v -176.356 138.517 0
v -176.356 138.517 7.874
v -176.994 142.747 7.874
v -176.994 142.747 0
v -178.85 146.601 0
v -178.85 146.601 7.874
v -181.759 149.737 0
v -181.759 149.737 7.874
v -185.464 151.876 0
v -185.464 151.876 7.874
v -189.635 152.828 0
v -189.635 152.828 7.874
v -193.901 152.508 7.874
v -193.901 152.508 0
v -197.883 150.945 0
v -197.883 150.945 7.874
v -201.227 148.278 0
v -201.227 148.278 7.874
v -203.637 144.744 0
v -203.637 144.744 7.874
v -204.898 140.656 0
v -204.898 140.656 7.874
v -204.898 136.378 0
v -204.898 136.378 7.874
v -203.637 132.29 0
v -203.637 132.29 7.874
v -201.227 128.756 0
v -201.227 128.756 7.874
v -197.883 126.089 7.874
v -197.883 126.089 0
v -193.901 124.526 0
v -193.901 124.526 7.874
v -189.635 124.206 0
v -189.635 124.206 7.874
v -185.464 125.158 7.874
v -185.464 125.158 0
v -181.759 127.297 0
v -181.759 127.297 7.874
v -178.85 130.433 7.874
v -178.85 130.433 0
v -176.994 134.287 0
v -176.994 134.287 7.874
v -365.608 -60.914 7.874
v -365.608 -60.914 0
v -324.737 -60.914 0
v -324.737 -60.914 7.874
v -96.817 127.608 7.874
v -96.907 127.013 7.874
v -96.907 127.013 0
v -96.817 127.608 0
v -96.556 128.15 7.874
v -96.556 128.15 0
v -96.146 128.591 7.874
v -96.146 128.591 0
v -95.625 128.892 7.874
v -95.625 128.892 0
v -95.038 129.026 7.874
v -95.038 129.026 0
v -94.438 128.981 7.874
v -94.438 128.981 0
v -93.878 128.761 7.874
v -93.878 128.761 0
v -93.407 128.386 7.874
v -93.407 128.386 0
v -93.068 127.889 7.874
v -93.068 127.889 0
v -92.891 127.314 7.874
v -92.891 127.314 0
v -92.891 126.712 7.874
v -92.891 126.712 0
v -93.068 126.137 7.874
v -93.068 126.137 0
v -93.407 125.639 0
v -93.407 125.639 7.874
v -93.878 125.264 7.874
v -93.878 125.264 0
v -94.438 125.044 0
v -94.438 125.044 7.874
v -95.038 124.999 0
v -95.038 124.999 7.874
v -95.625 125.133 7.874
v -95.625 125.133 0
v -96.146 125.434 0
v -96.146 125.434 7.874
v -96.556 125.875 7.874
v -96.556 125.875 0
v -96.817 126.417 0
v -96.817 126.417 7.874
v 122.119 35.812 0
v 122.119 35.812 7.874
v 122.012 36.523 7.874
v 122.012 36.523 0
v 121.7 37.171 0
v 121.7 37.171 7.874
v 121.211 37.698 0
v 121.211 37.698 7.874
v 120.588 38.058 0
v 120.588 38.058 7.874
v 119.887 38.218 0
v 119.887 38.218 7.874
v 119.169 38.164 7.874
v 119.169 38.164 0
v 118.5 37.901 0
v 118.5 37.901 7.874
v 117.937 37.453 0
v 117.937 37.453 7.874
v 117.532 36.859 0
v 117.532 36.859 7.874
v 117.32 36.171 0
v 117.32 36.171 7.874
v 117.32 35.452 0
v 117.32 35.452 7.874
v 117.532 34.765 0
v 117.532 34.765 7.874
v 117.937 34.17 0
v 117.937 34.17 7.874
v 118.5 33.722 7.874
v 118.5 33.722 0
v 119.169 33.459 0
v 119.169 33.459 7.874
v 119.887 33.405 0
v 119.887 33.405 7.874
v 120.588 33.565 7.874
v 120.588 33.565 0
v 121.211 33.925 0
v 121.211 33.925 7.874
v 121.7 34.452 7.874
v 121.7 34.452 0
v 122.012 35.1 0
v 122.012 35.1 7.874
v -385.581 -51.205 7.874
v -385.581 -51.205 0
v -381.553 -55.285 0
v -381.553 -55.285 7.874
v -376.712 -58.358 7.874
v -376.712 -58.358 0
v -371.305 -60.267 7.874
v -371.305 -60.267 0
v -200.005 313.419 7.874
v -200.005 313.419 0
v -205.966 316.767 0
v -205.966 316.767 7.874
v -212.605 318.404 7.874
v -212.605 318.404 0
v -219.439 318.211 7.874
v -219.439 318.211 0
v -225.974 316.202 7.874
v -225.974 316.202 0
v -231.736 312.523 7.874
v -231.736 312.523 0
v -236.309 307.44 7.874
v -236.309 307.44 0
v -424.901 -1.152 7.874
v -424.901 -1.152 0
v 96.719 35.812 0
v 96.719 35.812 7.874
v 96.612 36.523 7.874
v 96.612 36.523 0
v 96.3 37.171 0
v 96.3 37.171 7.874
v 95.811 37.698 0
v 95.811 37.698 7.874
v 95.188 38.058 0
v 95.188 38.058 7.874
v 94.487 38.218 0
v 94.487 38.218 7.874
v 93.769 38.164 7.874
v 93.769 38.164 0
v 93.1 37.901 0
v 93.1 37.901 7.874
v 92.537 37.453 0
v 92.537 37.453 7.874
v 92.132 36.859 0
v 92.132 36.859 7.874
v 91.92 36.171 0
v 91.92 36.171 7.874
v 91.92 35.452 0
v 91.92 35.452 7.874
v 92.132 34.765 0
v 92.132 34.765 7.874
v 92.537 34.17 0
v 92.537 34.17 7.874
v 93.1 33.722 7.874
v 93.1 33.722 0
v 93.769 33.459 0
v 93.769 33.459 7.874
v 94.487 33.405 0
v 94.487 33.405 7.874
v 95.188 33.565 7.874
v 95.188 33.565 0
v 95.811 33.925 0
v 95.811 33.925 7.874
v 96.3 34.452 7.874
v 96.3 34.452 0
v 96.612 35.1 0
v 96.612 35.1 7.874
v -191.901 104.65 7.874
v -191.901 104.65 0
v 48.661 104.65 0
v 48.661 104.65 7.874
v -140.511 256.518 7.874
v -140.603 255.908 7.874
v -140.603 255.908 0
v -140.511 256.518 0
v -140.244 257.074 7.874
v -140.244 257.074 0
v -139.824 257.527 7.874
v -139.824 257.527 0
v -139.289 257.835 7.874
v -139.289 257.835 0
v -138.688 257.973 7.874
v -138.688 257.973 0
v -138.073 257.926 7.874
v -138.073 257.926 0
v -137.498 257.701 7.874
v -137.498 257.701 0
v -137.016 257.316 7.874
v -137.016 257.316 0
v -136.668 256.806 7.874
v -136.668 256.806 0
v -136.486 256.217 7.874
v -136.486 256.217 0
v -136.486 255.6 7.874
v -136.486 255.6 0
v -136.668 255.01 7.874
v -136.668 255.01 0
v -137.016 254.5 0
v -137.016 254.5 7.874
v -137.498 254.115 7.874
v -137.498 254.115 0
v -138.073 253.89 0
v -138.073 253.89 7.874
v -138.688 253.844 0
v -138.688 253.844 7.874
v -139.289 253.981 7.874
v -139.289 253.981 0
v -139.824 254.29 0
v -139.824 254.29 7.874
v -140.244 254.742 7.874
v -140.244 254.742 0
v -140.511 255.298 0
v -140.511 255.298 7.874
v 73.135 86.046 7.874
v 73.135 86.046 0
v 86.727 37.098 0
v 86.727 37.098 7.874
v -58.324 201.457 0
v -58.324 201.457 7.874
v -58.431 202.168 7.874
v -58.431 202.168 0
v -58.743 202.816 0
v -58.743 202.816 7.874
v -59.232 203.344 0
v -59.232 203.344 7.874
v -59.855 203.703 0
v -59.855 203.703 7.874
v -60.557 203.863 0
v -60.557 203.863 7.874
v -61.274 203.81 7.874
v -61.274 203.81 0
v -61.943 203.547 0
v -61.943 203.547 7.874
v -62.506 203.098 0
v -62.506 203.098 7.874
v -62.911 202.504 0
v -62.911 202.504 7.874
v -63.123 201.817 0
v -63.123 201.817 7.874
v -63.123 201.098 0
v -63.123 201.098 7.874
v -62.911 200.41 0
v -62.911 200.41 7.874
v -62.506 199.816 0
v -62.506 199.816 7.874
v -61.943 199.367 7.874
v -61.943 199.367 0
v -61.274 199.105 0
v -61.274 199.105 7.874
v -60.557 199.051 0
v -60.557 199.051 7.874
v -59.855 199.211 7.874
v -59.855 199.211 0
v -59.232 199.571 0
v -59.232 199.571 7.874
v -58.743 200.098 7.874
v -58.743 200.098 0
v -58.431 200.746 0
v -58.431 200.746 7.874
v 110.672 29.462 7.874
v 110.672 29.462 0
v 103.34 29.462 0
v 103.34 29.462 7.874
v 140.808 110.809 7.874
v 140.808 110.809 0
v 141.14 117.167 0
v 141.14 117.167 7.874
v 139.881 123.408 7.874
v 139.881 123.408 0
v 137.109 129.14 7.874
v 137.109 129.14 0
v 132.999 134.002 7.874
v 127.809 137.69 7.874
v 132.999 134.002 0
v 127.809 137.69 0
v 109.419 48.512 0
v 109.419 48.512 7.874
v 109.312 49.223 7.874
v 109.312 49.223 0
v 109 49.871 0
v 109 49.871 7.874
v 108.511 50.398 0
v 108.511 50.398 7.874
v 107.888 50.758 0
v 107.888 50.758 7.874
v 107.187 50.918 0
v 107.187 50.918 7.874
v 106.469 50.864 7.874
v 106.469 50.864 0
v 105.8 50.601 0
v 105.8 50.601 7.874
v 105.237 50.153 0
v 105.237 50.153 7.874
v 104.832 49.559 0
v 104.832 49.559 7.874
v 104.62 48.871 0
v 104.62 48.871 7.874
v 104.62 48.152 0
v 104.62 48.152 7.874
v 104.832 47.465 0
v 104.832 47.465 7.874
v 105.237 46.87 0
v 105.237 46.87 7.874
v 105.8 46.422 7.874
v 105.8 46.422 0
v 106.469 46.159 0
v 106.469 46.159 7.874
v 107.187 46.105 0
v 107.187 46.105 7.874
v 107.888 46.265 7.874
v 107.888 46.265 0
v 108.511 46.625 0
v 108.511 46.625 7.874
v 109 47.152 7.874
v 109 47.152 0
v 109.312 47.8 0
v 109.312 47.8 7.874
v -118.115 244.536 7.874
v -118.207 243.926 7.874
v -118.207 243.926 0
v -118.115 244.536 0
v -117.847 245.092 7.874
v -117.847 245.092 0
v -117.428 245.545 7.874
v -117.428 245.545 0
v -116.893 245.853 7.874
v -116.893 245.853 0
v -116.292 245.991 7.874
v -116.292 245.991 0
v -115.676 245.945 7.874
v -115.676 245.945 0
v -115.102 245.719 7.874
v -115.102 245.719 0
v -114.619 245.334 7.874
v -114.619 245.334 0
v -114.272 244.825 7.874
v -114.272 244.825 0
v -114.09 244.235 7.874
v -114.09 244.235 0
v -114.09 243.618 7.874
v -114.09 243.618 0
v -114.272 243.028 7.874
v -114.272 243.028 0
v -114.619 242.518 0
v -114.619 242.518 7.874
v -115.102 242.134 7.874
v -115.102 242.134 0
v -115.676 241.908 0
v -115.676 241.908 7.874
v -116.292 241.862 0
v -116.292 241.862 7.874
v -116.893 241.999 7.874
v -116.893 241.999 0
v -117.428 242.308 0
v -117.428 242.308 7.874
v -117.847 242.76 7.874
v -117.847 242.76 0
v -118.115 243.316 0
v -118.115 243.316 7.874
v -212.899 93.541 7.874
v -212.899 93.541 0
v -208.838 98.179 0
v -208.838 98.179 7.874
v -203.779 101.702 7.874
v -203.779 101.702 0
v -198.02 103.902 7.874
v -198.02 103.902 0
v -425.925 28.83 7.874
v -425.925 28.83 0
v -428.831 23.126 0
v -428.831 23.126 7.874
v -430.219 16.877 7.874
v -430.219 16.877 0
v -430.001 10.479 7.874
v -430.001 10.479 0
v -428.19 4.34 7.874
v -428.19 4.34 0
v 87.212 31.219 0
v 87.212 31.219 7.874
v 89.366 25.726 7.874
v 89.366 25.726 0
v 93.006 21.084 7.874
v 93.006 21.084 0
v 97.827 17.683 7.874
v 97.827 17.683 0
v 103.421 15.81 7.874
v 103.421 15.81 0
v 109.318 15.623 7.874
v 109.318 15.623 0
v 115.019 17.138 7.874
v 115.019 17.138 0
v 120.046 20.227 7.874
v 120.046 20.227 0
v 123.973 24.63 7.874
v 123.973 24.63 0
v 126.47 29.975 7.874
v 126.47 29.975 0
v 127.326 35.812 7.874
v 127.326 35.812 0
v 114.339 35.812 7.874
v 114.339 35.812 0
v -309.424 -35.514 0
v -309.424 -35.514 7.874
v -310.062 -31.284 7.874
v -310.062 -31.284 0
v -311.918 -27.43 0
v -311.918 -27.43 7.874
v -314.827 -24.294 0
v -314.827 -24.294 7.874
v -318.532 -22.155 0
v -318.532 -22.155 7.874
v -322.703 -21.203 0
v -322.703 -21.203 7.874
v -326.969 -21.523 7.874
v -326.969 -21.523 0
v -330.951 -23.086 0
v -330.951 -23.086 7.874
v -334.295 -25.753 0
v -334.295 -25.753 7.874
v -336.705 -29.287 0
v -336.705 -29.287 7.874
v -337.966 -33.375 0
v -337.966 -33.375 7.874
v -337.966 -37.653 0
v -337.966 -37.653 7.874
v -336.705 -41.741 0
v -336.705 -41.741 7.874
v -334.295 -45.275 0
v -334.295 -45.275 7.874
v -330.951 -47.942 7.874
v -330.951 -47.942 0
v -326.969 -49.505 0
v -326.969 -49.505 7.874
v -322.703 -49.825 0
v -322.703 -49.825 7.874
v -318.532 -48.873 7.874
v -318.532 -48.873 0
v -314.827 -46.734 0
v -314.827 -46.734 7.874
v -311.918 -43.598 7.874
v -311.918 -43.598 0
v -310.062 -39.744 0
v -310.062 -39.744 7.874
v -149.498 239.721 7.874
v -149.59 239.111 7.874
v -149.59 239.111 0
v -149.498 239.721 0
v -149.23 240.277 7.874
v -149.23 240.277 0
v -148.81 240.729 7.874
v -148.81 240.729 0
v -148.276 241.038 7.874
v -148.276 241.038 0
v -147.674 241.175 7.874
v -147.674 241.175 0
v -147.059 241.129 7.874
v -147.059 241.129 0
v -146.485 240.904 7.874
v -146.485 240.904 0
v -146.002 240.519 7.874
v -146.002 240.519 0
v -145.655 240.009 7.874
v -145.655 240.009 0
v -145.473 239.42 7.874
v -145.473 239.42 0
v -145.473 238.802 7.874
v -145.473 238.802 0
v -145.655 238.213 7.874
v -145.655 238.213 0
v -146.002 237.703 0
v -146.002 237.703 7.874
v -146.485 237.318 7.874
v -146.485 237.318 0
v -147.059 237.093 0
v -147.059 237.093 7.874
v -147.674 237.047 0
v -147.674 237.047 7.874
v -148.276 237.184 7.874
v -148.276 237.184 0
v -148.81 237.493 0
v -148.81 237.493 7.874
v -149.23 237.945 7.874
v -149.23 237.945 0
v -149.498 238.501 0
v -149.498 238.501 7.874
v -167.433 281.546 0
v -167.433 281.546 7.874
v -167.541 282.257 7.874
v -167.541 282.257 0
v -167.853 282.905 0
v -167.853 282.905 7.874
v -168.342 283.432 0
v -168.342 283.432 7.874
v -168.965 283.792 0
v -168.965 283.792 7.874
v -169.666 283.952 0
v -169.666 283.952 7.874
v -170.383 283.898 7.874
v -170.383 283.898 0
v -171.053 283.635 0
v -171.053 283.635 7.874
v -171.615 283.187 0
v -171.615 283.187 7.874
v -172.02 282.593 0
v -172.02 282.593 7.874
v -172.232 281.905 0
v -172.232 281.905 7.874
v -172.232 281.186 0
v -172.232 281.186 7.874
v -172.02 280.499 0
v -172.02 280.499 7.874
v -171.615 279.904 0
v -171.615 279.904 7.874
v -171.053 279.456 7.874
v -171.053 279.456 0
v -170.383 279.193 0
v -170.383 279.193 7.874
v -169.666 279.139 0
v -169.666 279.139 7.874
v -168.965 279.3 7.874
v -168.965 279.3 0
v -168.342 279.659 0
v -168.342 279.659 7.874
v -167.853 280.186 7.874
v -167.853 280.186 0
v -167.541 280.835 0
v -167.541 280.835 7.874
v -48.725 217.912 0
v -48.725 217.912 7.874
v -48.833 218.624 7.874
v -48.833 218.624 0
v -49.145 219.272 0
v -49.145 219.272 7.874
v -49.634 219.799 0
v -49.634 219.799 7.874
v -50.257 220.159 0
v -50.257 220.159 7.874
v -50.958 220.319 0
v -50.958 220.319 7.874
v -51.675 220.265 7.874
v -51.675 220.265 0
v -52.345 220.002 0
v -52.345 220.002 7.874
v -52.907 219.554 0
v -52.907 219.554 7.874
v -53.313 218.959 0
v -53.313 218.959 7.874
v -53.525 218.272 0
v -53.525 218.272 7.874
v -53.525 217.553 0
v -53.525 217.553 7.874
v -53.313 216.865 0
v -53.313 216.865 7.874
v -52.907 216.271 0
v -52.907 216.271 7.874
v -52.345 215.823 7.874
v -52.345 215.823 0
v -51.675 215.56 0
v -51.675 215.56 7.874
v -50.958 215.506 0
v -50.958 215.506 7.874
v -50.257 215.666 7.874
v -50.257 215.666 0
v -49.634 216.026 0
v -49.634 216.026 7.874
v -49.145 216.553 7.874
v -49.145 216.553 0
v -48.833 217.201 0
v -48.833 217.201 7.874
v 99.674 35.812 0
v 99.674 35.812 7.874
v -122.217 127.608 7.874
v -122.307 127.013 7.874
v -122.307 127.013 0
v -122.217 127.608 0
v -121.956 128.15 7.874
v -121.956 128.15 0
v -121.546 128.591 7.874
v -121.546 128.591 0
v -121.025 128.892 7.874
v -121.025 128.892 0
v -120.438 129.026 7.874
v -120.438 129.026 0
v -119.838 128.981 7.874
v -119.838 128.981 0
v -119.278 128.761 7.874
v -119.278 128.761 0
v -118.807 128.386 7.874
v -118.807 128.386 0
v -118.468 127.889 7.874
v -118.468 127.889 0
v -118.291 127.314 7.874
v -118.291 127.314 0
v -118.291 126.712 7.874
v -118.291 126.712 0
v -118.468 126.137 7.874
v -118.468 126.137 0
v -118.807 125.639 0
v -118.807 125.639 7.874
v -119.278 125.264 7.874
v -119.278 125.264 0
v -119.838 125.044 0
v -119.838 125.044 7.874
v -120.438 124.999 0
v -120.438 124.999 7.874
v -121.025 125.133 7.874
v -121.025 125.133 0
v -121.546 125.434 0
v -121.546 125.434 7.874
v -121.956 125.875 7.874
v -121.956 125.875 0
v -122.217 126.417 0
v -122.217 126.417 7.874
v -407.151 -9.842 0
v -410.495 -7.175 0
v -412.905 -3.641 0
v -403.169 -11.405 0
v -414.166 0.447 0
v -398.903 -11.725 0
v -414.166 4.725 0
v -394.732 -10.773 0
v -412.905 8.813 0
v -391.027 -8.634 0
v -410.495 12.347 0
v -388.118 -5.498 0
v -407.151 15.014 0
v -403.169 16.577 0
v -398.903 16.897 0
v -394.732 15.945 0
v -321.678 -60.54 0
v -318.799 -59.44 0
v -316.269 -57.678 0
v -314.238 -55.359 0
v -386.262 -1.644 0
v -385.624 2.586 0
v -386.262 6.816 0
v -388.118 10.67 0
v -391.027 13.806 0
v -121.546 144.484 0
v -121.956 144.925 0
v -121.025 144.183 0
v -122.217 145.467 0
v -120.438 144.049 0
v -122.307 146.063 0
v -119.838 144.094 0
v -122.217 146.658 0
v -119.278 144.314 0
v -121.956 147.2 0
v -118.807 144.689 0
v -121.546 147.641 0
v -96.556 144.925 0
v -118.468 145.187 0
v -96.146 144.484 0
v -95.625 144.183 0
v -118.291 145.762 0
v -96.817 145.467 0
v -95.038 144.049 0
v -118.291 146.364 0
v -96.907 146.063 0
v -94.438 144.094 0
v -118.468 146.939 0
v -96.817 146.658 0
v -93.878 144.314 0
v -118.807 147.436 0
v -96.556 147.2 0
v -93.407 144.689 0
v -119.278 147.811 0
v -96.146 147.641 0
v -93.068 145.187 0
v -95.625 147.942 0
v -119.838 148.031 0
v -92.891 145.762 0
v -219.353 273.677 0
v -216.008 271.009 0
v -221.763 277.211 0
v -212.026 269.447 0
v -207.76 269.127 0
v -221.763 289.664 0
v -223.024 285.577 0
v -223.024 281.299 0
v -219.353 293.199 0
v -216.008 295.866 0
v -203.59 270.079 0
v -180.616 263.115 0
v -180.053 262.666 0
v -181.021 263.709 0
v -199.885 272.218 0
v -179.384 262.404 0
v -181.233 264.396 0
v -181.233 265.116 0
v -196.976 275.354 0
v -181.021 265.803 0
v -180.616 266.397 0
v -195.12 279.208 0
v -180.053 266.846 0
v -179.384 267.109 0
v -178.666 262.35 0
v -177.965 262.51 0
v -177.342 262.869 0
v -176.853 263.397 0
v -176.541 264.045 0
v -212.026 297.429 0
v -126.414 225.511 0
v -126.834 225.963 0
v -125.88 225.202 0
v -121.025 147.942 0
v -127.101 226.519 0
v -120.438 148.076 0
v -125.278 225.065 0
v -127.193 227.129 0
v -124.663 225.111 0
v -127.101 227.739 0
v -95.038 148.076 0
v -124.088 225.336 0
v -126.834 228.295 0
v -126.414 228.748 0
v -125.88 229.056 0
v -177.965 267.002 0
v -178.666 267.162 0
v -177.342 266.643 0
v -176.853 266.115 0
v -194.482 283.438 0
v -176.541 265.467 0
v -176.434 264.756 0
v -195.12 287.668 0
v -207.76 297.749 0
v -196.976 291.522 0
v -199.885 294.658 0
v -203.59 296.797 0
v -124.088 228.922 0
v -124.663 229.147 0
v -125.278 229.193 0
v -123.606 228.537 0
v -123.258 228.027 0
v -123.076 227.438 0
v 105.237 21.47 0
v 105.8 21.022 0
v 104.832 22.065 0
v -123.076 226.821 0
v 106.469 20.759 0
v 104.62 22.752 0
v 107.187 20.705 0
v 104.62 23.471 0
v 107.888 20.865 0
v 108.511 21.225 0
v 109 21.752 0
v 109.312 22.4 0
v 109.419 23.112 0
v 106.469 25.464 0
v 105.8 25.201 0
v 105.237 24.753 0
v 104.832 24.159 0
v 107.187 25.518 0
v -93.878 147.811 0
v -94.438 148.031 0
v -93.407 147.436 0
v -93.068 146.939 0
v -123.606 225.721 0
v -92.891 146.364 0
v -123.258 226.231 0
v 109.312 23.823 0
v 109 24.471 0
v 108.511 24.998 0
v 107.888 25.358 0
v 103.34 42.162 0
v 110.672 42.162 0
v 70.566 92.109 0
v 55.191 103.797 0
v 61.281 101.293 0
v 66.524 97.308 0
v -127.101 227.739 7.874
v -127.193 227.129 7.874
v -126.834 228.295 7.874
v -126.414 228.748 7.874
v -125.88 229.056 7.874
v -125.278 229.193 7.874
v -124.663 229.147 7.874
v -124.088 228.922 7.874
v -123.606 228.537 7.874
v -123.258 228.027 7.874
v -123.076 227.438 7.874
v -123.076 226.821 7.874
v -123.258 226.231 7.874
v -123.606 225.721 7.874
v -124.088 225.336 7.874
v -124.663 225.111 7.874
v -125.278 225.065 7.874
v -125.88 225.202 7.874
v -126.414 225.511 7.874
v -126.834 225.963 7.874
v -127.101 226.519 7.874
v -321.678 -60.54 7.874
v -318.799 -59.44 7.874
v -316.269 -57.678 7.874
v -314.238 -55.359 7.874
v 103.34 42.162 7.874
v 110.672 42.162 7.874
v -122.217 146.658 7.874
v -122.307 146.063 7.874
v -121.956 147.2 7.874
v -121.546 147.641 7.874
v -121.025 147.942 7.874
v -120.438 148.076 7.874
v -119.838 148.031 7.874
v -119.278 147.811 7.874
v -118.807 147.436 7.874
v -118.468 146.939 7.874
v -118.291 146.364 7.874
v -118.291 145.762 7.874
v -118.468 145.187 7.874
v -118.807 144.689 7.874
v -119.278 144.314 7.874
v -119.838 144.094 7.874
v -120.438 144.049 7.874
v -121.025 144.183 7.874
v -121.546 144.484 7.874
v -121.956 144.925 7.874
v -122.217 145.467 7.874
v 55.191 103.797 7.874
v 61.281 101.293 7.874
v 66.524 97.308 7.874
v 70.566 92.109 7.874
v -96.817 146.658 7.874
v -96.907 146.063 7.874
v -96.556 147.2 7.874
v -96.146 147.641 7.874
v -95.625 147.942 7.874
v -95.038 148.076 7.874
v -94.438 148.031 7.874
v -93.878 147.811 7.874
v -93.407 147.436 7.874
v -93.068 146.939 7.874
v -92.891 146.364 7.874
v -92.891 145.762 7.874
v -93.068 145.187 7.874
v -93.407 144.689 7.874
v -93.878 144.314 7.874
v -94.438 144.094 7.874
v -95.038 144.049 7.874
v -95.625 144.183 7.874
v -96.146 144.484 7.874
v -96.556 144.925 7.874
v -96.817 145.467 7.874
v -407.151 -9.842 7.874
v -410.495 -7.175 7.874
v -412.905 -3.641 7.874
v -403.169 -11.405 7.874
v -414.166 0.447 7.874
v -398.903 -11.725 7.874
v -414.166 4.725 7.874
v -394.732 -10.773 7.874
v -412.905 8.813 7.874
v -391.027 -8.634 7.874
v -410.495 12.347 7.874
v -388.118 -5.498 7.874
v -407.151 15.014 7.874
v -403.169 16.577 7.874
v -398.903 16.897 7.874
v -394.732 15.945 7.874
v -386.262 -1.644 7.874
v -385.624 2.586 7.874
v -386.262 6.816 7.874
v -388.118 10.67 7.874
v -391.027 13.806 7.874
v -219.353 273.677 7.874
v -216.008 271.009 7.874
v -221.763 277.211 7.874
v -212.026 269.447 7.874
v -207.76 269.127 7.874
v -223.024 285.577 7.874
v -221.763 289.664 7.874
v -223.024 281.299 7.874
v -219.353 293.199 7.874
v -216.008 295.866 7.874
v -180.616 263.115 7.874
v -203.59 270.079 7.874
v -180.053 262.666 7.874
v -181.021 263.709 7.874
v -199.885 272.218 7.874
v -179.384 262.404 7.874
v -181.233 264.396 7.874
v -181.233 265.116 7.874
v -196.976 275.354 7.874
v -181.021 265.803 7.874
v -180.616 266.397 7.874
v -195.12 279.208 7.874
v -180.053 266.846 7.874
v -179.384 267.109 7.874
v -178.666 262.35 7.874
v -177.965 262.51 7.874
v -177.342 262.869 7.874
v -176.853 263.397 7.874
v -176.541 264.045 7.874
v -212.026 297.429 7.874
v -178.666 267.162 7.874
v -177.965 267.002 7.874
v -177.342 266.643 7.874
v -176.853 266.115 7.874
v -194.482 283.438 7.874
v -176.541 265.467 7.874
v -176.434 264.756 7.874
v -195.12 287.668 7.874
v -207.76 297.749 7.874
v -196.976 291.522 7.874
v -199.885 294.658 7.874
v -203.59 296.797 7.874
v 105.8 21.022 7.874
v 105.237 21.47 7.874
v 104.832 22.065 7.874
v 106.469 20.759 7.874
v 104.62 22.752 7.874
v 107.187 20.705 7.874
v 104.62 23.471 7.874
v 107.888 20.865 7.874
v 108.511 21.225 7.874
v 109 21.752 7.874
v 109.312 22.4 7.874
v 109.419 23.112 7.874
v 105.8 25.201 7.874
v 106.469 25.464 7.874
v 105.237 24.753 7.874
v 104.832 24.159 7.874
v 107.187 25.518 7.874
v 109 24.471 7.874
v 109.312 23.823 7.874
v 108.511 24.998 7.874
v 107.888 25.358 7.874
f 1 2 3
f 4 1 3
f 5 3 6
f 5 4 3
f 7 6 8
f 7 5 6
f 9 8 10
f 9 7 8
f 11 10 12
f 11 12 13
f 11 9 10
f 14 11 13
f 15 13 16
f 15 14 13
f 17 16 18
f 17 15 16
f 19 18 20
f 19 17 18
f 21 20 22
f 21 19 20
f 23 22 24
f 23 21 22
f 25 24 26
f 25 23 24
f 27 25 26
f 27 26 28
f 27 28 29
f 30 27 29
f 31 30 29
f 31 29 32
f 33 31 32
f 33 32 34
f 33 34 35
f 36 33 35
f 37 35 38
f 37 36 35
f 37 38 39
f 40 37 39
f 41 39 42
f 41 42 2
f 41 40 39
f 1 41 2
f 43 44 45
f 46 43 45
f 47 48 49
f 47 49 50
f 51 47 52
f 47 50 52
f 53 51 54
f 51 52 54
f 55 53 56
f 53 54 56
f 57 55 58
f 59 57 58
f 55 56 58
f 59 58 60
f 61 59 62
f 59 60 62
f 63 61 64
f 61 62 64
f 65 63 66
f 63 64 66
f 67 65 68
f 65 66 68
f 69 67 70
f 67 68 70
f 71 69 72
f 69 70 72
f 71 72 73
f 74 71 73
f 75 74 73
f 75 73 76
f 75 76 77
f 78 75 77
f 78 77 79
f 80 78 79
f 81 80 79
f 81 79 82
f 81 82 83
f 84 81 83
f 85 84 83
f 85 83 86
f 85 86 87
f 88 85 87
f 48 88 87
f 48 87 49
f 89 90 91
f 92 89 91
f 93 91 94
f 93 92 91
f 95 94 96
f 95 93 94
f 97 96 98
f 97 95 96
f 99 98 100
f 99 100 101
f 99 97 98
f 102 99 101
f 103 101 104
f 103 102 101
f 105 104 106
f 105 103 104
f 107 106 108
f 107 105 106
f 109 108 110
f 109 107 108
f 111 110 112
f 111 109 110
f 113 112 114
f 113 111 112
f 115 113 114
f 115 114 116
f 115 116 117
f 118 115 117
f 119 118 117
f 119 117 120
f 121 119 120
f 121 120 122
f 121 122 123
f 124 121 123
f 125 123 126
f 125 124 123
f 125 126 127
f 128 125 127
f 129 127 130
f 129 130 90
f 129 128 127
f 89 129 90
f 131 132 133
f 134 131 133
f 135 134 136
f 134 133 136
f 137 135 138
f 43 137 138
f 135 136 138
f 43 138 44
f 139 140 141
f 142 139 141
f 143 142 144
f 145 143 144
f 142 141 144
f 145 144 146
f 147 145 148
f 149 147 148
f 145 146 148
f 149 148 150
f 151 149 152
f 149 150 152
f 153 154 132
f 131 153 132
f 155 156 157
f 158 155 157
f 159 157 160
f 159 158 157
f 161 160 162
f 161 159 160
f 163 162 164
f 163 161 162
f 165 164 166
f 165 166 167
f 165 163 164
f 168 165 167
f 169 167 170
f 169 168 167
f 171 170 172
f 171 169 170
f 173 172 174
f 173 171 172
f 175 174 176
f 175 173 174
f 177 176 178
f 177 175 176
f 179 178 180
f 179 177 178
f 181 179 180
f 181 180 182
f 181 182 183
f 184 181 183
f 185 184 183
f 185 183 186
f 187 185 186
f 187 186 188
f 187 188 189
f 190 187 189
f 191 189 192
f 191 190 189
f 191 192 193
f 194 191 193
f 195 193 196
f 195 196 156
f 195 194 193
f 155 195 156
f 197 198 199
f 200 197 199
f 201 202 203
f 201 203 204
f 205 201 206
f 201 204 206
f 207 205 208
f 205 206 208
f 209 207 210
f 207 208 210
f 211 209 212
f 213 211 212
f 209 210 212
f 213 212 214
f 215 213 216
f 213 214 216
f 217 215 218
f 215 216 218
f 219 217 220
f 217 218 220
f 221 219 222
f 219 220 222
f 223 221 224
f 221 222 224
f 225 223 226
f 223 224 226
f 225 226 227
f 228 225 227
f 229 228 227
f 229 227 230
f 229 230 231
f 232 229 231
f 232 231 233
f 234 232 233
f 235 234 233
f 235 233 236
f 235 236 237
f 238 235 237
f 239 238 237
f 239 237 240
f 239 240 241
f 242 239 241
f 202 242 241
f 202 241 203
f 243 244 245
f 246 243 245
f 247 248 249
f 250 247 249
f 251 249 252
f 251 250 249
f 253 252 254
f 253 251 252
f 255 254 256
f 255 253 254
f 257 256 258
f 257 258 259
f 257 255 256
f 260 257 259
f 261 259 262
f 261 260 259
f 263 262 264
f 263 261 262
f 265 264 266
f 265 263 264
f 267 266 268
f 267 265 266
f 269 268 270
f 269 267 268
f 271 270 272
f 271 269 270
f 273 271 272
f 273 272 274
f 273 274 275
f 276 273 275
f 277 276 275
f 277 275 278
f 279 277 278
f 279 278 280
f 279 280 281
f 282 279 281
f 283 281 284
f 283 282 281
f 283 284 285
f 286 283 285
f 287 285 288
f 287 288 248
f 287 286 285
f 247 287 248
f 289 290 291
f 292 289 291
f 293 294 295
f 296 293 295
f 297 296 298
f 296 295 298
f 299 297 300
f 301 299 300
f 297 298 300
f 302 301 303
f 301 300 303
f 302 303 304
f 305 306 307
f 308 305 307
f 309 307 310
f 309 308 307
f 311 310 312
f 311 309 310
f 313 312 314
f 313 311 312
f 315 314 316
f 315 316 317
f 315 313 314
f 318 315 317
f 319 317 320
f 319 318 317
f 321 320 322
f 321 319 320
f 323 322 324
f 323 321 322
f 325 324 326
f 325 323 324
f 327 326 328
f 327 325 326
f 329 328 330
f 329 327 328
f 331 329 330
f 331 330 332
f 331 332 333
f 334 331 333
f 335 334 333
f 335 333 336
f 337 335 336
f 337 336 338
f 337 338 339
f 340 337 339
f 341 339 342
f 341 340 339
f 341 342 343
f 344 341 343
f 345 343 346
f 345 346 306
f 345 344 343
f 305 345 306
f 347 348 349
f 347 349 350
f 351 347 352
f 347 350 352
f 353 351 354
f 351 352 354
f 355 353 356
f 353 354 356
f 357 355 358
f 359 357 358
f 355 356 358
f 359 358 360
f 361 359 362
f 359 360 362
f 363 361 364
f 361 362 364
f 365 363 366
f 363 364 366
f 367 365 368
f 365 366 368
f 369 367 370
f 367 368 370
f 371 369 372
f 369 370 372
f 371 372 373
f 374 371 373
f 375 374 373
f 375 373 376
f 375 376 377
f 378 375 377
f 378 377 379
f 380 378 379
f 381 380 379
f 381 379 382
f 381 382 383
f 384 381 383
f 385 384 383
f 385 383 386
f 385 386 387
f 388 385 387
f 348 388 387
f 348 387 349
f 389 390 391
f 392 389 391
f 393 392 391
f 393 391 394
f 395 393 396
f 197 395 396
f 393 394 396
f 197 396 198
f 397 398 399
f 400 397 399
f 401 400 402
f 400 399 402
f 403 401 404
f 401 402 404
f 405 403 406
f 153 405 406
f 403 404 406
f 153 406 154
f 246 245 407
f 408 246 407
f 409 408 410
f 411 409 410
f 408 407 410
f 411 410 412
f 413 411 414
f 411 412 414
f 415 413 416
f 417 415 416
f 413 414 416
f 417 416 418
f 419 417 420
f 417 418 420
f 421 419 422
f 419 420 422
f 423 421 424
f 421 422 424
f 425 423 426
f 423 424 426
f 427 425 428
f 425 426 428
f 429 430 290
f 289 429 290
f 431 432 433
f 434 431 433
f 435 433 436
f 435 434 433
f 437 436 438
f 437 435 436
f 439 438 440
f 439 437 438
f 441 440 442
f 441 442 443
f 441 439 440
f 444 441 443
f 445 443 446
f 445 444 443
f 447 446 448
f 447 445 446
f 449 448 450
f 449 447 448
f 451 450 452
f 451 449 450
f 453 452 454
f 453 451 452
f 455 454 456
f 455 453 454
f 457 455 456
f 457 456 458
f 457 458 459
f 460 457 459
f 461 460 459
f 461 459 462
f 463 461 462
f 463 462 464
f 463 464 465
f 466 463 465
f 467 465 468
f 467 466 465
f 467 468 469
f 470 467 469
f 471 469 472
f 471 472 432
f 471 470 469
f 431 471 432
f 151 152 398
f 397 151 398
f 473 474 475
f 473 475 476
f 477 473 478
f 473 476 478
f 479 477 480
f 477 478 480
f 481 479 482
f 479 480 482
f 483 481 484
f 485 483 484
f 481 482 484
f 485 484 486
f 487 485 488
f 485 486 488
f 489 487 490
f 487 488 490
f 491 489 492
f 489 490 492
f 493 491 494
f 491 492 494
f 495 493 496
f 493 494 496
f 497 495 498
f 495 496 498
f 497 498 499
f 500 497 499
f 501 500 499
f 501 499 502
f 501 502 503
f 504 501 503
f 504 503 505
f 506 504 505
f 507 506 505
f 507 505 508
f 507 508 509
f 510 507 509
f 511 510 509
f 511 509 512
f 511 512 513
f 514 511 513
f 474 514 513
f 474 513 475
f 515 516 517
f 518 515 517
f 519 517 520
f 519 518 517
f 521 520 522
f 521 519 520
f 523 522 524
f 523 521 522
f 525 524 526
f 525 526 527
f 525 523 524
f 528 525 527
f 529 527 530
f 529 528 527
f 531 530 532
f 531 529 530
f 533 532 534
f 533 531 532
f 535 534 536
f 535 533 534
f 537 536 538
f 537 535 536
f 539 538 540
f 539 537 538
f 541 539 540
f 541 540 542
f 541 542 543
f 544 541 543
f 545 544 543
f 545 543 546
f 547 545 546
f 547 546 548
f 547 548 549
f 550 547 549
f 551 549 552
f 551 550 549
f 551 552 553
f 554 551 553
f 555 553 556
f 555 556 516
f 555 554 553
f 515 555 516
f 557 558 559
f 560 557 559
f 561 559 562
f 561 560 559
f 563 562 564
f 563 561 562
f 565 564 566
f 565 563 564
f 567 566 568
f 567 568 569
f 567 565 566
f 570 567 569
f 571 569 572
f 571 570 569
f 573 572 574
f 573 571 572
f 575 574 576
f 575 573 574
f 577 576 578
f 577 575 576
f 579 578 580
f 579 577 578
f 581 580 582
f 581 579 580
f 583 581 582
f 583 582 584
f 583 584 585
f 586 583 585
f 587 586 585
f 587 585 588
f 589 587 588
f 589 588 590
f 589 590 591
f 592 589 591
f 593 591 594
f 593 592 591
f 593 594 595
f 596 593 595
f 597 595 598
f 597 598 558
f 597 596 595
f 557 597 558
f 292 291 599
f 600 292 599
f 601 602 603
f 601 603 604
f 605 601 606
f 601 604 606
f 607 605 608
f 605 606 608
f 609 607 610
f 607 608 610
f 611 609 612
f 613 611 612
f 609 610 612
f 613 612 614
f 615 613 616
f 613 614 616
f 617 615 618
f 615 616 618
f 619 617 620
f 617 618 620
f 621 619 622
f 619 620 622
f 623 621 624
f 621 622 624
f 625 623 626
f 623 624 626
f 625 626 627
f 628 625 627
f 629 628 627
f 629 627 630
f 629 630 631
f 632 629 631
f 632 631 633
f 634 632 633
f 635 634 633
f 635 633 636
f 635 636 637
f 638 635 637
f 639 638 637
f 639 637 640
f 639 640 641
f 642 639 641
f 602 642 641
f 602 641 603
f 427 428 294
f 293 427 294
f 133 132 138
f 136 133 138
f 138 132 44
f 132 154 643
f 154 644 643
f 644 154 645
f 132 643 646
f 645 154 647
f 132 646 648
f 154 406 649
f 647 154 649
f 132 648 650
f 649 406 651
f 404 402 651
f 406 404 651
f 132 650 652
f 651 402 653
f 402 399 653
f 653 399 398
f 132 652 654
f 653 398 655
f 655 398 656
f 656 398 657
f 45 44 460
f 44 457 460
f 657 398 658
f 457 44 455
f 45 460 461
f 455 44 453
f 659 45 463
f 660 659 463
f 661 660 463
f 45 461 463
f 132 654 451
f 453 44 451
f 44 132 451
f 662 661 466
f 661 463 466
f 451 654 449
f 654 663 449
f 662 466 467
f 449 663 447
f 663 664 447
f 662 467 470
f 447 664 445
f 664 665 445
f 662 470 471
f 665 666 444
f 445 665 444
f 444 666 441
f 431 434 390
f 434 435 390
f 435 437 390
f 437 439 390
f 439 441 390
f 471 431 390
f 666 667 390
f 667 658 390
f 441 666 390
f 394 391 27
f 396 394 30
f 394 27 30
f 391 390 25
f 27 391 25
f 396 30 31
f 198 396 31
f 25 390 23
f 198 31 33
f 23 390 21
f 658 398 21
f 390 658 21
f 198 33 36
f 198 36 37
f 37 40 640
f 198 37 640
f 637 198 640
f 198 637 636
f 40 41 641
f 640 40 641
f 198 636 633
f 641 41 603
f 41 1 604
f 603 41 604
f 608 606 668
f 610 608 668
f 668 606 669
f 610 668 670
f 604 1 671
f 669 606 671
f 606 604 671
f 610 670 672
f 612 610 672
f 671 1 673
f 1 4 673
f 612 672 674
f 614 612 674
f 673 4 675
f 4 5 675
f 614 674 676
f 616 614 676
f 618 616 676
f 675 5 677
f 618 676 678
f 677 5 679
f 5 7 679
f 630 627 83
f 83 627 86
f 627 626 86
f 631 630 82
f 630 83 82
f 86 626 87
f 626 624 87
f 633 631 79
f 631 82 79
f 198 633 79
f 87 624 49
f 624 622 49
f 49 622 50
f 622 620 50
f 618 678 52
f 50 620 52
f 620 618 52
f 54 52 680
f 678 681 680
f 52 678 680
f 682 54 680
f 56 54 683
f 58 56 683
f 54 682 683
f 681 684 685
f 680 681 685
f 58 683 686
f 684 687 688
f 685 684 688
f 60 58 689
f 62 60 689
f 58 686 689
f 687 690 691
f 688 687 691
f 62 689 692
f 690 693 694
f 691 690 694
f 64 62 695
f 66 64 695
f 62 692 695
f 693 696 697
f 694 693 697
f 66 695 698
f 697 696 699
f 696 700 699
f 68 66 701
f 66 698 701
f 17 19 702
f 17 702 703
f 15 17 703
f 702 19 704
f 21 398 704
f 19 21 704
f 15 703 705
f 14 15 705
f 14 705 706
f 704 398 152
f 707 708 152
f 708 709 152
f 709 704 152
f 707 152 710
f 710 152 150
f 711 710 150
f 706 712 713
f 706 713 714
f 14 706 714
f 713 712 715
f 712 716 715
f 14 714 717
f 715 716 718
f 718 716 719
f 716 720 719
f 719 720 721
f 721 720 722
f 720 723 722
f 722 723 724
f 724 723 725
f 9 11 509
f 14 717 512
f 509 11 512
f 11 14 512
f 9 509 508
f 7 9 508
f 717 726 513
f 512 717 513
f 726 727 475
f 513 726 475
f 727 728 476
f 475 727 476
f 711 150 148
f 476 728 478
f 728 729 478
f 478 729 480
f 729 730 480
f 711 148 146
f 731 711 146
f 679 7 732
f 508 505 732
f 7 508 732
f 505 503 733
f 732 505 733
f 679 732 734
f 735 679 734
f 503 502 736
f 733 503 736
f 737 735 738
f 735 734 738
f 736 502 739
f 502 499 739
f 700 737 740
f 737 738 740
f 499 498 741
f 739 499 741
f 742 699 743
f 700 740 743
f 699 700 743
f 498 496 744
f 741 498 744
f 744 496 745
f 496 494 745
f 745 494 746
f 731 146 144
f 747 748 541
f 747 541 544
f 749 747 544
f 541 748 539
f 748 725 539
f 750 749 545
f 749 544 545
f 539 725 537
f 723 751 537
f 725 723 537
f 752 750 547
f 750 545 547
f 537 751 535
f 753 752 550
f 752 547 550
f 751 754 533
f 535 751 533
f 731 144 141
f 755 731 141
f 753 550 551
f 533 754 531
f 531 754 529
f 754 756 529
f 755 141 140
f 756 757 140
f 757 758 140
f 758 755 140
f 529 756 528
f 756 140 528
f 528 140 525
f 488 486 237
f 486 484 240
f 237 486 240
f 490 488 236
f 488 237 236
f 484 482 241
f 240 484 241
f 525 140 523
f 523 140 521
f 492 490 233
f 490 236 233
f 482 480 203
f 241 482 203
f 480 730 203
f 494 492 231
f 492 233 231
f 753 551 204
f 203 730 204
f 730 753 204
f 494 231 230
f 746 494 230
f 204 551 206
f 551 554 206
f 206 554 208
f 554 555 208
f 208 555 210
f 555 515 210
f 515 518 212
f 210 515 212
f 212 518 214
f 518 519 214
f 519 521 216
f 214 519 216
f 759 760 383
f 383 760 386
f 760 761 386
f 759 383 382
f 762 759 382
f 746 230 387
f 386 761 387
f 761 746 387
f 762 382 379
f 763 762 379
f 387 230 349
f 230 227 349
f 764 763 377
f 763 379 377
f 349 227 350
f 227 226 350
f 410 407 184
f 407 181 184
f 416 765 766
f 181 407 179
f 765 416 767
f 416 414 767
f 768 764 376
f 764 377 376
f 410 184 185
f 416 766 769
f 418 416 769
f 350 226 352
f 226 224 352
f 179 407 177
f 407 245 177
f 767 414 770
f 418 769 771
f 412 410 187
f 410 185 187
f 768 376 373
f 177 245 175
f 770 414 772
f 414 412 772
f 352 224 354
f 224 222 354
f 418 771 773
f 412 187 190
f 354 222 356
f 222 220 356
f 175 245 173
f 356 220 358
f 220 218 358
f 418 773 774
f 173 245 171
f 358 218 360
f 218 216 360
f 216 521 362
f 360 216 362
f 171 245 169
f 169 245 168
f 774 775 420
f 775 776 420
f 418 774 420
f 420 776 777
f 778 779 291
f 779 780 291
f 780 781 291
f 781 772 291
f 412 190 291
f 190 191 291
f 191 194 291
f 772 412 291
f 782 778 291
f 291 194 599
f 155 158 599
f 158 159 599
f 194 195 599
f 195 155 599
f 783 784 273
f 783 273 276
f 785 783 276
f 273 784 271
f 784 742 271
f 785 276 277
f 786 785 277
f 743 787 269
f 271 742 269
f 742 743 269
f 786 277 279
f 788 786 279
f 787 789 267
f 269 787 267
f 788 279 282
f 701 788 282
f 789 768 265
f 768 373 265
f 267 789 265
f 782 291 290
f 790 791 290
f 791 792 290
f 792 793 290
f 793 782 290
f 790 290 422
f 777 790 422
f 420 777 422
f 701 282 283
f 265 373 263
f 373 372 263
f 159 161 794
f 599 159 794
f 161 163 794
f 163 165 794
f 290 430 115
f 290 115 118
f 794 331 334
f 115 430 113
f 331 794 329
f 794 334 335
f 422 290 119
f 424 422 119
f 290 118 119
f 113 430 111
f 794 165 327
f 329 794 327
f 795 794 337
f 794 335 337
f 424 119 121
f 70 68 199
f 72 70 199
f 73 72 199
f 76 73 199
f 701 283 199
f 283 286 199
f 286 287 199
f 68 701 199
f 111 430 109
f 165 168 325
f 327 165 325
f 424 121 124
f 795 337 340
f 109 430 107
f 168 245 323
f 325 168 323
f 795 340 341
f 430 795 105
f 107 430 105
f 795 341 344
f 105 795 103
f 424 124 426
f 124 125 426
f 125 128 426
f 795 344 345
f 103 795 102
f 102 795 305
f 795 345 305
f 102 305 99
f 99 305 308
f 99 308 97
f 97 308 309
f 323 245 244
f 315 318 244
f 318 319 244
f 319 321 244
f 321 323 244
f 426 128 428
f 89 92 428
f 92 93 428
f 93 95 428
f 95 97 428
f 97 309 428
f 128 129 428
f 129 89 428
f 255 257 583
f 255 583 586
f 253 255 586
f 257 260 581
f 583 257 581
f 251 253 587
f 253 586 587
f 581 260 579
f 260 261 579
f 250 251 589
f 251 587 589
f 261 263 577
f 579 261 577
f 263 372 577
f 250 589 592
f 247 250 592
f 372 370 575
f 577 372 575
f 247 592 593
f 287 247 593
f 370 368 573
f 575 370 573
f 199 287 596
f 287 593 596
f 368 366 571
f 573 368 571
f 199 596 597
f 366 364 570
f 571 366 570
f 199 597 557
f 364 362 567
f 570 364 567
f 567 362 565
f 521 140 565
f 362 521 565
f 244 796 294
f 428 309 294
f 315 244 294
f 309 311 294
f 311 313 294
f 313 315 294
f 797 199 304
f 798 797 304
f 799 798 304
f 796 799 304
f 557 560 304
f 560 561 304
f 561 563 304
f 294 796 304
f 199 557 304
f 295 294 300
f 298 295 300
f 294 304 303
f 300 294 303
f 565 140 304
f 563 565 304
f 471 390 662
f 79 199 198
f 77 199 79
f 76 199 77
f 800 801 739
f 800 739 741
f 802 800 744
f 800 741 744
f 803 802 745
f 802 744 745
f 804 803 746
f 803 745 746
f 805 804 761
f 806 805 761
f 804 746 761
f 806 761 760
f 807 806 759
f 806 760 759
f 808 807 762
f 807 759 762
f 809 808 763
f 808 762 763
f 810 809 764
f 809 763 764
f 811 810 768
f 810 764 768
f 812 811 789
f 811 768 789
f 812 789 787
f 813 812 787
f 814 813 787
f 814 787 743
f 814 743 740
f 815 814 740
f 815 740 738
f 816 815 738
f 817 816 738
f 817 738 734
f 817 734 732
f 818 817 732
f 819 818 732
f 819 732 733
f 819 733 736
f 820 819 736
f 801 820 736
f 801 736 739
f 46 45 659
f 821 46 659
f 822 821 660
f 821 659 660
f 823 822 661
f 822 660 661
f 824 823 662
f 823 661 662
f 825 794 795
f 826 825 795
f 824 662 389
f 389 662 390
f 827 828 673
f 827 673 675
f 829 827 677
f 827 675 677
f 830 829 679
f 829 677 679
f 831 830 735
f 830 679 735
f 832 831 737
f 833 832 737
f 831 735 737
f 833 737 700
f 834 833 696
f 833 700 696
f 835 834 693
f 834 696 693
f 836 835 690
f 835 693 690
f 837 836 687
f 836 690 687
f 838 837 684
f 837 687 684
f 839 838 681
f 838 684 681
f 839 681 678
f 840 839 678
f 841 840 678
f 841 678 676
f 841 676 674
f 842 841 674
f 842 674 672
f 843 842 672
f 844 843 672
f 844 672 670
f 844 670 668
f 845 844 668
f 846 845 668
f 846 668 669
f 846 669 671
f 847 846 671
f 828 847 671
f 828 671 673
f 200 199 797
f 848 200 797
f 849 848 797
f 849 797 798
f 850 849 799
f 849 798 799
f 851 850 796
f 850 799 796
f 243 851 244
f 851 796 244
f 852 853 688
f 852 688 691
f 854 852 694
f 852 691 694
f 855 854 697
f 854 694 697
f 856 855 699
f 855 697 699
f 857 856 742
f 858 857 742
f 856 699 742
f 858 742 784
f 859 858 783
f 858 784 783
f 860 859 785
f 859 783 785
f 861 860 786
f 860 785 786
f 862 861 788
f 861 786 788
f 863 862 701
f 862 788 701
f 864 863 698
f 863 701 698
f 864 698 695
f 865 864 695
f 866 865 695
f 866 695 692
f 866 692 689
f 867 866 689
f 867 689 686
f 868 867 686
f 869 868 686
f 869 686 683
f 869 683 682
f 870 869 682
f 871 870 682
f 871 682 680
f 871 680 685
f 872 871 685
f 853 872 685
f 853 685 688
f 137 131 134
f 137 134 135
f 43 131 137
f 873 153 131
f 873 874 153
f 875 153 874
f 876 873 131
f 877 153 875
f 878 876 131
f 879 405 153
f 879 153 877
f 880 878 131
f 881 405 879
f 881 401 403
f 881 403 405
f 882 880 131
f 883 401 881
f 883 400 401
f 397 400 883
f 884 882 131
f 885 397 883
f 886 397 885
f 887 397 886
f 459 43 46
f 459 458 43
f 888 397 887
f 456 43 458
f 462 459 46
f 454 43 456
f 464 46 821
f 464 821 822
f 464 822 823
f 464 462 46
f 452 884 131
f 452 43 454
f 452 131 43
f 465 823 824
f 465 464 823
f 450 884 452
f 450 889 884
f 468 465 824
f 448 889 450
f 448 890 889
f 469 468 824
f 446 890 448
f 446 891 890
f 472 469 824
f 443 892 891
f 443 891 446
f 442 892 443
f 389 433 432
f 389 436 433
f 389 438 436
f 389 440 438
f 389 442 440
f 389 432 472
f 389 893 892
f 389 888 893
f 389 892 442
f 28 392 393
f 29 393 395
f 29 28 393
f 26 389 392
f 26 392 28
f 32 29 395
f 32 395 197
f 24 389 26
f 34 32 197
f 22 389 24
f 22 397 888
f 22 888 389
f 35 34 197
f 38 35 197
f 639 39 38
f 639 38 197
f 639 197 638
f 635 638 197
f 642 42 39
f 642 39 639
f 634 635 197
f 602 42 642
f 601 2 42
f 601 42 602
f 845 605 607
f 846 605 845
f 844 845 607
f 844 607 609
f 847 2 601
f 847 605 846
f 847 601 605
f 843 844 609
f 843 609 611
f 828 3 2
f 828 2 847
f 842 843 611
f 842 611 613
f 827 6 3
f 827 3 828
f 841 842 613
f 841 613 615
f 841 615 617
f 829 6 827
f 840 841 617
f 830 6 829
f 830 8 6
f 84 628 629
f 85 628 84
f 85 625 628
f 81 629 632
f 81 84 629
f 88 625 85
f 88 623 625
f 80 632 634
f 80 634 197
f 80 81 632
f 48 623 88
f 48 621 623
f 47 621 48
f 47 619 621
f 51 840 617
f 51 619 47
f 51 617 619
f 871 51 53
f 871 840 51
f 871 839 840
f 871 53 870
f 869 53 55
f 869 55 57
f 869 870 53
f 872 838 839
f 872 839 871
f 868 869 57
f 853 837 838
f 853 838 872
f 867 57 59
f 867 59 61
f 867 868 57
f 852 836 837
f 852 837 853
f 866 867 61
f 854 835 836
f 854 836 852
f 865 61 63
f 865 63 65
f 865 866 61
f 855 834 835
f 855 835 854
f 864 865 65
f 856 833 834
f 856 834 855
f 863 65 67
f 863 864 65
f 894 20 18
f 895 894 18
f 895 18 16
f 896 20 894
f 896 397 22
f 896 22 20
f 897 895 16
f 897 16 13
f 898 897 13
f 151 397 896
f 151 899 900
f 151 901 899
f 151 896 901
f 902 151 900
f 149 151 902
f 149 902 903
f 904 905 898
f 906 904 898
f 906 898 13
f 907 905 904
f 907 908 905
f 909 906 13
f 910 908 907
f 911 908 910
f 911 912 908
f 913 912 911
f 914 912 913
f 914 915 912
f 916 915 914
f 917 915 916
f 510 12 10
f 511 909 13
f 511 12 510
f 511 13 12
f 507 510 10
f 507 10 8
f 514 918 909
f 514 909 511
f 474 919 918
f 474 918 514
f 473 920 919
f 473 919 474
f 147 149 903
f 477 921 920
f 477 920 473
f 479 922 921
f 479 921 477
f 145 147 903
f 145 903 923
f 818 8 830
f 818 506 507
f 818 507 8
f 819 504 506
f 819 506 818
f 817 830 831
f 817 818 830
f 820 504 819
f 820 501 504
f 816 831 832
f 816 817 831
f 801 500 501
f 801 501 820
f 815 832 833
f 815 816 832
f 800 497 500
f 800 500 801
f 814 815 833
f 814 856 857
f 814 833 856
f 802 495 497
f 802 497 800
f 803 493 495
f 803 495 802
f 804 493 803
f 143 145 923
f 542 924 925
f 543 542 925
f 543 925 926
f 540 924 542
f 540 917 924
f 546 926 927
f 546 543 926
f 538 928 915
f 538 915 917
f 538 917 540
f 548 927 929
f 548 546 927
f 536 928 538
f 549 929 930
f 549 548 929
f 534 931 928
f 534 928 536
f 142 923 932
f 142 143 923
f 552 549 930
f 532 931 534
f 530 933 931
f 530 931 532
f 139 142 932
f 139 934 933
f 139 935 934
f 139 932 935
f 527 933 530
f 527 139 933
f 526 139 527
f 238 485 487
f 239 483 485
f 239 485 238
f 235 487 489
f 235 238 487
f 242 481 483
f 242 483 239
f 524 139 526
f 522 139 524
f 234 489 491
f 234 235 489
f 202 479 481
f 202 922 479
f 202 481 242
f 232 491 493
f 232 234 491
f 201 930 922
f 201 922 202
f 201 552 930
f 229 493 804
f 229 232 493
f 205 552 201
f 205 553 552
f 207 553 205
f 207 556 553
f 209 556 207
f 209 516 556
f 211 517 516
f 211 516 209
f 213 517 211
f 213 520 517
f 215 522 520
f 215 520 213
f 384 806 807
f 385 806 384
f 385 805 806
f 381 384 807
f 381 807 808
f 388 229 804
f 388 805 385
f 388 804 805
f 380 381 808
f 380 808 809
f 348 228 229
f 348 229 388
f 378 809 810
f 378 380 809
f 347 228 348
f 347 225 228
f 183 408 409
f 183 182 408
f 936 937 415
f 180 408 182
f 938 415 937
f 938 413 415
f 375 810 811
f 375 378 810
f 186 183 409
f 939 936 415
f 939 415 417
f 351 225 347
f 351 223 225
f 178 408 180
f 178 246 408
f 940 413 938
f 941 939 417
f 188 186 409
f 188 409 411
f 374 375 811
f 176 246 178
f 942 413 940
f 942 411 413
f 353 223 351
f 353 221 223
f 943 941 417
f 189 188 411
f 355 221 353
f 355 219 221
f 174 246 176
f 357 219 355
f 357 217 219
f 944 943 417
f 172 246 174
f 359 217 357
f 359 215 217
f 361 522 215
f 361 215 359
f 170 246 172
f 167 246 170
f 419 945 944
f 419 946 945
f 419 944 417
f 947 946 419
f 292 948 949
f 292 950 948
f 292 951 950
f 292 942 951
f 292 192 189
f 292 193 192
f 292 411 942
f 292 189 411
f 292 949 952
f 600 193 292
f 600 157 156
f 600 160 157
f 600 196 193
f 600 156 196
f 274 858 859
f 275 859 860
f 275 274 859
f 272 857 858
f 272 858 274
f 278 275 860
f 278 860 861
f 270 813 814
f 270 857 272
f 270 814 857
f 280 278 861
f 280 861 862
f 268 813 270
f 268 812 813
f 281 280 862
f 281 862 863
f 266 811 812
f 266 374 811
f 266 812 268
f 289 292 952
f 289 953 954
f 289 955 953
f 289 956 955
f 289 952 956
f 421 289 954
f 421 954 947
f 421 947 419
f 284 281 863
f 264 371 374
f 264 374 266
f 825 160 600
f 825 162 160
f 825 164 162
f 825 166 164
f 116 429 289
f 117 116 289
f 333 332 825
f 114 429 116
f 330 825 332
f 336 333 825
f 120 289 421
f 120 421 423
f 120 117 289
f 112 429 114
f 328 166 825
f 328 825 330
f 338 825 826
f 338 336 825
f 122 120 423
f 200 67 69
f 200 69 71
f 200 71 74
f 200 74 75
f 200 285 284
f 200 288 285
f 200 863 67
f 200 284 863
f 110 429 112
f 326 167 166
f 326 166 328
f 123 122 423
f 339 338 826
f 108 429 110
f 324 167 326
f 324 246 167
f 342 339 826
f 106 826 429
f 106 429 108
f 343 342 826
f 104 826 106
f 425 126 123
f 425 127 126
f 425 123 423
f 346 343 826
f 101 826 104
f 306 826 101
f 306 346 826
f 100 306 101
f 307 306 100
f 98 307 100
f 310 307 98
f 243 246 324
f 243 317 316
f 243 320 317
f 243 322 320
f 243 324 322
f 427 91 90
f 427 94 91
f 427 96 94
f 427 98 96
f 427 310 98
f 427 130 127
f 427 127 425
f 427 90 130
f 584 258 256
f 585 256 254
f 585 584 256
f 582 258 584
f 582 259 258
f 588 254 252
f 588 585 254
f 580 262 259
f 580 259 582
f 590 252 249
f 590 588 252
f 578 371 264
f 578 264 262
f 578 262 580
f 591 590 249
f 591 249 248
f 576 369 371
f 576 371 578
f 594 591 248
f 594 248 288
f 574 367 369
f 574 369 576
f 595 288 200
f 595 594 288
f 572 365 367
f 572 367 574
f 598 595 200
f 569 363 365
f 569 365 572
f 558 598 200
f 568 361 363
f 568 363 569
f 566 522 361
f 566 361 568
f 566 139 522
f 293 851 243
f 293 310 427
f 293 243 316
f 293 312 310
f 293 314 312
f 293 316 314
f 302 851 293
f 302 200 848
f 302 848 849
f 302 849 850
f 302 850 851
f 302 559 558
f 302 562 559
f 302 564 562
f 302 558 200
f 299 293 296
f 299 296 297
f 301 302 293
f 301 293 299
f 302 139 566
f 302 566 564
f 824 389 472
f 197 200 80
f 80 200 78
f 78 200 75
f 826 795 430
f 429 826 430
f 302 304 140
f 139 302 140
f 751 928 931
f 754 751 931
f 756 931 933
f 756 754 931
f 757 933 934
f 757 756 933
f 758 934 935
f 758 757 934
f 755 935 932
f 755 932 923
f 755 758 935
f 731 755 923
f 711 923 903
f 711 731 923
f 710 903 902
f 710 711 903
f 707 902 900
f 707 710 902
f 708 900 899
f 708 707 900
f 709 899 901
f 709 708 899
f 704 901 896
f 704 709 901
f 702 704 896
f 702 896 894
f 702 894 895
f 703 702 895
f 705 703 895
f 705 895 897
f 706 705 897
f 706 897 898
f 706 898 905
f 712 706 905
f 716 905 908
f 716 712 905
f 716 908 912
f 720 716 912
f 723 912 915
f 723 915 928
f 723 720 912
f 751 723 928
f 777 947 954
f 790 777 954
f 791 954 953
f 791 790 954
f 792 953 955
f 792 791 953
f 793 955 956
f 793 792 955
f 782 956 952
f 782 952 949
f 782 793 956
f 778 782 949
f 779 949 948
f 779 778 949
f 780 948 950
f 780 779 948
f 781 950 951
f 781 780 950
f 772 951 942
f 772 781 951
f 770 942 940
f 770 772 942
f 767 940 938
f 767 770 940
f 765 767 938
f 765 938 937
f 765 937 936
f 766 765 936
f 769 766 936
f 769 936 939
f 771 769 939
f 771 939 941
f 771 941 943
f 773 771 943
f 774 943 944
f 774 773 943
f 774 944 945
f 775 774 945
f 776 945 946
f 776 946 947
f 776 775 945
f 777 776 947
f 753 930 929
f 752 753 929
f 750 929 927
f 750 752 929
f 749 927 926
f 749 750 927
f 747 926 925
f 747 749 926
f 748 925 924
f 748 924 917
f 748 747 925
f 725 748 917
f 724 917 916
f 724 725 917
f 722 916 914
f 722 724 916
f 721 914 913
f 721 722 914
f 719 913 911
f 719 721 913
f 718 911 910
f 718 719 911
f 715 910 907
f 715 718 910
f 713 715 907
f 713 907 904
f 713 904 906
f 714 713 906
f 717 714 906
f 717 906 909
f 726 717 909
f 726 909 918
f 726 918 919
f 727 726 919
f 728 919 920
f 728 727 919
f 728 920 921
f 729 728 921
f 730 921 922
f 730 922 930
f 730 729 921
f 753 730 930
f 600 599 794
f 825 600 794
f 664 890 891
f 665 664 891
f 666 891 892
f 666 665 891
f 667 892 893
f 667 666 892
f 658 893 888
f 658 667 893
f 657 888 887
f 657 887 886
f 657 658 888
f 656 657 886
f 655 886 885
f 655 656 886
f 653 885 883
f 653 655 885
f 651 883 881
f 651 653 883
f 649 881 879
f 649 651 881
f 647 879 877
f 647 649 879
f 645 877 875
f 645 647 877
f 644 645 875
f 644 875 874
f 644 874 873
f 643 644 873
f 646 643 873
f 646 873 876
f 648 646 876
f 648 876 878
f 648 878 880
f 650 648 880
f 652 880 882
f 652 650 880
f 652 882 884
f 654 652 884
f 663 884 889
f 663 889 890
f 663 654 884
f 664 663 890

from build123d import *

# Parameters (mm, degrees)
MODEL_R             = 14.351
MODEL_R_2           = 2.413
BOSS_EXTRUDE1_DEPTH = 7.874
SKETCH17_R          = 2.0701
CUT_EXTRUDE1_DEPTH  = 8.874
SKETCH18_R          = 2.0193
CUT_EXTRUDE2_DEPTH  = 8.874


with BuildPart() as part:
    # Model → Boss-Extrude1 (new body)
    with BuildSketch(Plane.XY):
        with BuildLine():
            Line((127.809114586, 137.689660276), (-200.005250584, 313.419470721))
            ThreePointArc((-200.005250584, 313.419470721), (-219.438743814, 318.210854709), (-236.308771814, 307.439588539))
            Line((-236.308771814, 307.439588539), (-425.925316767, 28.829603592))
            ThreePointArc((-425.925316767, 28.829603592), (-430.312243104, 13.671313347), (-424.900993017, -1.152223962))
            Line((-424.900993017, -1.152223962), (-385.581467186, -51.204797614))
            ThreePointArc((-385.581467186, -51.204797614), (-376.711879358, -58.358090396), (-365.607528193, -60.913979882))
            Line((-365.607528193, -60.913979882), (-324.737451002, -60.913979882))
            ThreePointArc((-324.737451002, -60.913979882), (-318.798508014, -59.439796386), (-314.23831963, -55.359484793))
            Line((-314.23831963, -55.359484793), (-212.899365952, 93.541257838))
            ThreePointArc((-212.899365952, 93.541257838), (-203.778989185, 101.701881024), (-191.901103209, 104.650248016))
            Line((-191.901103209, 104.650248016), (48.661197018, 104.650248016))
            ThreePointArc((48.661197018, 104.650248016), (64.032332507, 99.471232012), (73.135172194, 86.046168785))
            Line((73.135172194, 86.046168785), (86.727013732, 37.098218434))
            ThreePointArc((86.727013732, 37.098218434), (106.362581421, 15.501750179), (127.326236921, 35.811553418))
            Line((127.326236921, 35.811553418), (140.807890588, 110.809453484))
            ThreePointArc((140.807890588, 110.809453484), (138.675228362, 126.361225539), (127.809114586, 137.689660276))
        make_face()
        with Locations((-323.775189267, -35.513979882)):
            Circle(MODEL_R, mode=Mode.SUBTRACT)
        with Locations((-399.975189267, 2.586020118)):
            Circle(MODEL_R, mode=Mode.SUBTRACT)
        with Locations((107.006236921, 23.111553418)):
            Circle(MODEL_R_2, mode=Mode.SUBTRACT)
        with Locations((94.306236921, 35.811553418)):
            Circle(MODEL_R_2, mode=Mode.SUBTRACT)
        Polygon((110.67241113, 42.161553418), (114.33858534, 35.811553418), (110.67241113, 29.461553418), (103.340062712, 29.461553418), (99.673888502, 35.811553418), (103.340062712, 42.161553418), (107.006236921, 42.161553418), align=None, mode=Mode.SUBTRACT)
        with Locations((119.706236921, 35.811553418)):
            Circle(MODEL_R_2, mode=Mode.SUBTRACT)
        with Locations((107.006236921, 48.511553418)):
            Circle(MODEL_R_2, mode=Mode.SUBTRACT)
        with Locations((-190.707148919, 138.516914683)):
            Circle(MODEL_R, mode=Mode.SUBTRACT)
        with Locations((-178.846696227, 264.756008796)):
            Circle(MODEL_R_2, mode=Mode.SUBTRACT)
        with Locations((-208.832932893, 283.437784316)):
            Circle(MODEL_R, mode=Mode.SUBTRACT)
        with Locations((-169.846303212, 281.545750473)):
            Circle(MODEL_R_2, mode=Mode.SUBTRACT)
        with Locations((-60.736830905, 201.457194342)):
            Circle(MODEL_R_2, mode=Mode.SUBTRACT)
        with Locations((-51.138479016, 217.912410568)):
            Circle(MODEL_R_2, mode=Mode.SUBTRACT)
    extrude(amount=BOSS_EXTRUDE1_DEPTH)

    # Sketch17 → Cut-Extrude1 (cut, through all)
    with BuildSketch(Plane(origin=(0, 0, 0), x_dir=(-1, 0, 0), z_dir=(0, 0, -1))):
        with Locations((138.53320591, 255.908211149)):
            Circle(SKETCH17_R)
        with Locations((147.519620664, 239.110983703)):
            Circle(SKETCH17_R)
        with Locations((125.123317403, 227.129097364)):
            Circle(SKETCH17_R)
        with Locations((116.136902649, 243.92632481)):
            Circle(SKETCH17_R)
    extrude(amount=-CUT_EXTRUDE1_DEPTH, mode=Mode.SUBTRACT)

    # Sketch18 → Cut-Extrude2 (cut, through all)
    with BuildSketch(Plane(origin=(0, 0, 0), x_dir=(-1, 0, 0), z_dir=(0, 0, -1))):
        with Locations((120.287453551, 146.062677987)):
            Circle(SKETCH18_R)
        with Locations((120.287453551, 127.012677987)):
            Circle(SKETCH18_R)
        with Locations((94.887453551, 127.012677987)):
            Circle(SKETCH18_R)
        with Locations((94.887453551, 146.062677987)):
            Circle(SKETCH18_R)
    extrude(amount=-CUT_EXTRUDE2_DEPTH, mode=Mode.SUBTRACT)


solid = part.part
